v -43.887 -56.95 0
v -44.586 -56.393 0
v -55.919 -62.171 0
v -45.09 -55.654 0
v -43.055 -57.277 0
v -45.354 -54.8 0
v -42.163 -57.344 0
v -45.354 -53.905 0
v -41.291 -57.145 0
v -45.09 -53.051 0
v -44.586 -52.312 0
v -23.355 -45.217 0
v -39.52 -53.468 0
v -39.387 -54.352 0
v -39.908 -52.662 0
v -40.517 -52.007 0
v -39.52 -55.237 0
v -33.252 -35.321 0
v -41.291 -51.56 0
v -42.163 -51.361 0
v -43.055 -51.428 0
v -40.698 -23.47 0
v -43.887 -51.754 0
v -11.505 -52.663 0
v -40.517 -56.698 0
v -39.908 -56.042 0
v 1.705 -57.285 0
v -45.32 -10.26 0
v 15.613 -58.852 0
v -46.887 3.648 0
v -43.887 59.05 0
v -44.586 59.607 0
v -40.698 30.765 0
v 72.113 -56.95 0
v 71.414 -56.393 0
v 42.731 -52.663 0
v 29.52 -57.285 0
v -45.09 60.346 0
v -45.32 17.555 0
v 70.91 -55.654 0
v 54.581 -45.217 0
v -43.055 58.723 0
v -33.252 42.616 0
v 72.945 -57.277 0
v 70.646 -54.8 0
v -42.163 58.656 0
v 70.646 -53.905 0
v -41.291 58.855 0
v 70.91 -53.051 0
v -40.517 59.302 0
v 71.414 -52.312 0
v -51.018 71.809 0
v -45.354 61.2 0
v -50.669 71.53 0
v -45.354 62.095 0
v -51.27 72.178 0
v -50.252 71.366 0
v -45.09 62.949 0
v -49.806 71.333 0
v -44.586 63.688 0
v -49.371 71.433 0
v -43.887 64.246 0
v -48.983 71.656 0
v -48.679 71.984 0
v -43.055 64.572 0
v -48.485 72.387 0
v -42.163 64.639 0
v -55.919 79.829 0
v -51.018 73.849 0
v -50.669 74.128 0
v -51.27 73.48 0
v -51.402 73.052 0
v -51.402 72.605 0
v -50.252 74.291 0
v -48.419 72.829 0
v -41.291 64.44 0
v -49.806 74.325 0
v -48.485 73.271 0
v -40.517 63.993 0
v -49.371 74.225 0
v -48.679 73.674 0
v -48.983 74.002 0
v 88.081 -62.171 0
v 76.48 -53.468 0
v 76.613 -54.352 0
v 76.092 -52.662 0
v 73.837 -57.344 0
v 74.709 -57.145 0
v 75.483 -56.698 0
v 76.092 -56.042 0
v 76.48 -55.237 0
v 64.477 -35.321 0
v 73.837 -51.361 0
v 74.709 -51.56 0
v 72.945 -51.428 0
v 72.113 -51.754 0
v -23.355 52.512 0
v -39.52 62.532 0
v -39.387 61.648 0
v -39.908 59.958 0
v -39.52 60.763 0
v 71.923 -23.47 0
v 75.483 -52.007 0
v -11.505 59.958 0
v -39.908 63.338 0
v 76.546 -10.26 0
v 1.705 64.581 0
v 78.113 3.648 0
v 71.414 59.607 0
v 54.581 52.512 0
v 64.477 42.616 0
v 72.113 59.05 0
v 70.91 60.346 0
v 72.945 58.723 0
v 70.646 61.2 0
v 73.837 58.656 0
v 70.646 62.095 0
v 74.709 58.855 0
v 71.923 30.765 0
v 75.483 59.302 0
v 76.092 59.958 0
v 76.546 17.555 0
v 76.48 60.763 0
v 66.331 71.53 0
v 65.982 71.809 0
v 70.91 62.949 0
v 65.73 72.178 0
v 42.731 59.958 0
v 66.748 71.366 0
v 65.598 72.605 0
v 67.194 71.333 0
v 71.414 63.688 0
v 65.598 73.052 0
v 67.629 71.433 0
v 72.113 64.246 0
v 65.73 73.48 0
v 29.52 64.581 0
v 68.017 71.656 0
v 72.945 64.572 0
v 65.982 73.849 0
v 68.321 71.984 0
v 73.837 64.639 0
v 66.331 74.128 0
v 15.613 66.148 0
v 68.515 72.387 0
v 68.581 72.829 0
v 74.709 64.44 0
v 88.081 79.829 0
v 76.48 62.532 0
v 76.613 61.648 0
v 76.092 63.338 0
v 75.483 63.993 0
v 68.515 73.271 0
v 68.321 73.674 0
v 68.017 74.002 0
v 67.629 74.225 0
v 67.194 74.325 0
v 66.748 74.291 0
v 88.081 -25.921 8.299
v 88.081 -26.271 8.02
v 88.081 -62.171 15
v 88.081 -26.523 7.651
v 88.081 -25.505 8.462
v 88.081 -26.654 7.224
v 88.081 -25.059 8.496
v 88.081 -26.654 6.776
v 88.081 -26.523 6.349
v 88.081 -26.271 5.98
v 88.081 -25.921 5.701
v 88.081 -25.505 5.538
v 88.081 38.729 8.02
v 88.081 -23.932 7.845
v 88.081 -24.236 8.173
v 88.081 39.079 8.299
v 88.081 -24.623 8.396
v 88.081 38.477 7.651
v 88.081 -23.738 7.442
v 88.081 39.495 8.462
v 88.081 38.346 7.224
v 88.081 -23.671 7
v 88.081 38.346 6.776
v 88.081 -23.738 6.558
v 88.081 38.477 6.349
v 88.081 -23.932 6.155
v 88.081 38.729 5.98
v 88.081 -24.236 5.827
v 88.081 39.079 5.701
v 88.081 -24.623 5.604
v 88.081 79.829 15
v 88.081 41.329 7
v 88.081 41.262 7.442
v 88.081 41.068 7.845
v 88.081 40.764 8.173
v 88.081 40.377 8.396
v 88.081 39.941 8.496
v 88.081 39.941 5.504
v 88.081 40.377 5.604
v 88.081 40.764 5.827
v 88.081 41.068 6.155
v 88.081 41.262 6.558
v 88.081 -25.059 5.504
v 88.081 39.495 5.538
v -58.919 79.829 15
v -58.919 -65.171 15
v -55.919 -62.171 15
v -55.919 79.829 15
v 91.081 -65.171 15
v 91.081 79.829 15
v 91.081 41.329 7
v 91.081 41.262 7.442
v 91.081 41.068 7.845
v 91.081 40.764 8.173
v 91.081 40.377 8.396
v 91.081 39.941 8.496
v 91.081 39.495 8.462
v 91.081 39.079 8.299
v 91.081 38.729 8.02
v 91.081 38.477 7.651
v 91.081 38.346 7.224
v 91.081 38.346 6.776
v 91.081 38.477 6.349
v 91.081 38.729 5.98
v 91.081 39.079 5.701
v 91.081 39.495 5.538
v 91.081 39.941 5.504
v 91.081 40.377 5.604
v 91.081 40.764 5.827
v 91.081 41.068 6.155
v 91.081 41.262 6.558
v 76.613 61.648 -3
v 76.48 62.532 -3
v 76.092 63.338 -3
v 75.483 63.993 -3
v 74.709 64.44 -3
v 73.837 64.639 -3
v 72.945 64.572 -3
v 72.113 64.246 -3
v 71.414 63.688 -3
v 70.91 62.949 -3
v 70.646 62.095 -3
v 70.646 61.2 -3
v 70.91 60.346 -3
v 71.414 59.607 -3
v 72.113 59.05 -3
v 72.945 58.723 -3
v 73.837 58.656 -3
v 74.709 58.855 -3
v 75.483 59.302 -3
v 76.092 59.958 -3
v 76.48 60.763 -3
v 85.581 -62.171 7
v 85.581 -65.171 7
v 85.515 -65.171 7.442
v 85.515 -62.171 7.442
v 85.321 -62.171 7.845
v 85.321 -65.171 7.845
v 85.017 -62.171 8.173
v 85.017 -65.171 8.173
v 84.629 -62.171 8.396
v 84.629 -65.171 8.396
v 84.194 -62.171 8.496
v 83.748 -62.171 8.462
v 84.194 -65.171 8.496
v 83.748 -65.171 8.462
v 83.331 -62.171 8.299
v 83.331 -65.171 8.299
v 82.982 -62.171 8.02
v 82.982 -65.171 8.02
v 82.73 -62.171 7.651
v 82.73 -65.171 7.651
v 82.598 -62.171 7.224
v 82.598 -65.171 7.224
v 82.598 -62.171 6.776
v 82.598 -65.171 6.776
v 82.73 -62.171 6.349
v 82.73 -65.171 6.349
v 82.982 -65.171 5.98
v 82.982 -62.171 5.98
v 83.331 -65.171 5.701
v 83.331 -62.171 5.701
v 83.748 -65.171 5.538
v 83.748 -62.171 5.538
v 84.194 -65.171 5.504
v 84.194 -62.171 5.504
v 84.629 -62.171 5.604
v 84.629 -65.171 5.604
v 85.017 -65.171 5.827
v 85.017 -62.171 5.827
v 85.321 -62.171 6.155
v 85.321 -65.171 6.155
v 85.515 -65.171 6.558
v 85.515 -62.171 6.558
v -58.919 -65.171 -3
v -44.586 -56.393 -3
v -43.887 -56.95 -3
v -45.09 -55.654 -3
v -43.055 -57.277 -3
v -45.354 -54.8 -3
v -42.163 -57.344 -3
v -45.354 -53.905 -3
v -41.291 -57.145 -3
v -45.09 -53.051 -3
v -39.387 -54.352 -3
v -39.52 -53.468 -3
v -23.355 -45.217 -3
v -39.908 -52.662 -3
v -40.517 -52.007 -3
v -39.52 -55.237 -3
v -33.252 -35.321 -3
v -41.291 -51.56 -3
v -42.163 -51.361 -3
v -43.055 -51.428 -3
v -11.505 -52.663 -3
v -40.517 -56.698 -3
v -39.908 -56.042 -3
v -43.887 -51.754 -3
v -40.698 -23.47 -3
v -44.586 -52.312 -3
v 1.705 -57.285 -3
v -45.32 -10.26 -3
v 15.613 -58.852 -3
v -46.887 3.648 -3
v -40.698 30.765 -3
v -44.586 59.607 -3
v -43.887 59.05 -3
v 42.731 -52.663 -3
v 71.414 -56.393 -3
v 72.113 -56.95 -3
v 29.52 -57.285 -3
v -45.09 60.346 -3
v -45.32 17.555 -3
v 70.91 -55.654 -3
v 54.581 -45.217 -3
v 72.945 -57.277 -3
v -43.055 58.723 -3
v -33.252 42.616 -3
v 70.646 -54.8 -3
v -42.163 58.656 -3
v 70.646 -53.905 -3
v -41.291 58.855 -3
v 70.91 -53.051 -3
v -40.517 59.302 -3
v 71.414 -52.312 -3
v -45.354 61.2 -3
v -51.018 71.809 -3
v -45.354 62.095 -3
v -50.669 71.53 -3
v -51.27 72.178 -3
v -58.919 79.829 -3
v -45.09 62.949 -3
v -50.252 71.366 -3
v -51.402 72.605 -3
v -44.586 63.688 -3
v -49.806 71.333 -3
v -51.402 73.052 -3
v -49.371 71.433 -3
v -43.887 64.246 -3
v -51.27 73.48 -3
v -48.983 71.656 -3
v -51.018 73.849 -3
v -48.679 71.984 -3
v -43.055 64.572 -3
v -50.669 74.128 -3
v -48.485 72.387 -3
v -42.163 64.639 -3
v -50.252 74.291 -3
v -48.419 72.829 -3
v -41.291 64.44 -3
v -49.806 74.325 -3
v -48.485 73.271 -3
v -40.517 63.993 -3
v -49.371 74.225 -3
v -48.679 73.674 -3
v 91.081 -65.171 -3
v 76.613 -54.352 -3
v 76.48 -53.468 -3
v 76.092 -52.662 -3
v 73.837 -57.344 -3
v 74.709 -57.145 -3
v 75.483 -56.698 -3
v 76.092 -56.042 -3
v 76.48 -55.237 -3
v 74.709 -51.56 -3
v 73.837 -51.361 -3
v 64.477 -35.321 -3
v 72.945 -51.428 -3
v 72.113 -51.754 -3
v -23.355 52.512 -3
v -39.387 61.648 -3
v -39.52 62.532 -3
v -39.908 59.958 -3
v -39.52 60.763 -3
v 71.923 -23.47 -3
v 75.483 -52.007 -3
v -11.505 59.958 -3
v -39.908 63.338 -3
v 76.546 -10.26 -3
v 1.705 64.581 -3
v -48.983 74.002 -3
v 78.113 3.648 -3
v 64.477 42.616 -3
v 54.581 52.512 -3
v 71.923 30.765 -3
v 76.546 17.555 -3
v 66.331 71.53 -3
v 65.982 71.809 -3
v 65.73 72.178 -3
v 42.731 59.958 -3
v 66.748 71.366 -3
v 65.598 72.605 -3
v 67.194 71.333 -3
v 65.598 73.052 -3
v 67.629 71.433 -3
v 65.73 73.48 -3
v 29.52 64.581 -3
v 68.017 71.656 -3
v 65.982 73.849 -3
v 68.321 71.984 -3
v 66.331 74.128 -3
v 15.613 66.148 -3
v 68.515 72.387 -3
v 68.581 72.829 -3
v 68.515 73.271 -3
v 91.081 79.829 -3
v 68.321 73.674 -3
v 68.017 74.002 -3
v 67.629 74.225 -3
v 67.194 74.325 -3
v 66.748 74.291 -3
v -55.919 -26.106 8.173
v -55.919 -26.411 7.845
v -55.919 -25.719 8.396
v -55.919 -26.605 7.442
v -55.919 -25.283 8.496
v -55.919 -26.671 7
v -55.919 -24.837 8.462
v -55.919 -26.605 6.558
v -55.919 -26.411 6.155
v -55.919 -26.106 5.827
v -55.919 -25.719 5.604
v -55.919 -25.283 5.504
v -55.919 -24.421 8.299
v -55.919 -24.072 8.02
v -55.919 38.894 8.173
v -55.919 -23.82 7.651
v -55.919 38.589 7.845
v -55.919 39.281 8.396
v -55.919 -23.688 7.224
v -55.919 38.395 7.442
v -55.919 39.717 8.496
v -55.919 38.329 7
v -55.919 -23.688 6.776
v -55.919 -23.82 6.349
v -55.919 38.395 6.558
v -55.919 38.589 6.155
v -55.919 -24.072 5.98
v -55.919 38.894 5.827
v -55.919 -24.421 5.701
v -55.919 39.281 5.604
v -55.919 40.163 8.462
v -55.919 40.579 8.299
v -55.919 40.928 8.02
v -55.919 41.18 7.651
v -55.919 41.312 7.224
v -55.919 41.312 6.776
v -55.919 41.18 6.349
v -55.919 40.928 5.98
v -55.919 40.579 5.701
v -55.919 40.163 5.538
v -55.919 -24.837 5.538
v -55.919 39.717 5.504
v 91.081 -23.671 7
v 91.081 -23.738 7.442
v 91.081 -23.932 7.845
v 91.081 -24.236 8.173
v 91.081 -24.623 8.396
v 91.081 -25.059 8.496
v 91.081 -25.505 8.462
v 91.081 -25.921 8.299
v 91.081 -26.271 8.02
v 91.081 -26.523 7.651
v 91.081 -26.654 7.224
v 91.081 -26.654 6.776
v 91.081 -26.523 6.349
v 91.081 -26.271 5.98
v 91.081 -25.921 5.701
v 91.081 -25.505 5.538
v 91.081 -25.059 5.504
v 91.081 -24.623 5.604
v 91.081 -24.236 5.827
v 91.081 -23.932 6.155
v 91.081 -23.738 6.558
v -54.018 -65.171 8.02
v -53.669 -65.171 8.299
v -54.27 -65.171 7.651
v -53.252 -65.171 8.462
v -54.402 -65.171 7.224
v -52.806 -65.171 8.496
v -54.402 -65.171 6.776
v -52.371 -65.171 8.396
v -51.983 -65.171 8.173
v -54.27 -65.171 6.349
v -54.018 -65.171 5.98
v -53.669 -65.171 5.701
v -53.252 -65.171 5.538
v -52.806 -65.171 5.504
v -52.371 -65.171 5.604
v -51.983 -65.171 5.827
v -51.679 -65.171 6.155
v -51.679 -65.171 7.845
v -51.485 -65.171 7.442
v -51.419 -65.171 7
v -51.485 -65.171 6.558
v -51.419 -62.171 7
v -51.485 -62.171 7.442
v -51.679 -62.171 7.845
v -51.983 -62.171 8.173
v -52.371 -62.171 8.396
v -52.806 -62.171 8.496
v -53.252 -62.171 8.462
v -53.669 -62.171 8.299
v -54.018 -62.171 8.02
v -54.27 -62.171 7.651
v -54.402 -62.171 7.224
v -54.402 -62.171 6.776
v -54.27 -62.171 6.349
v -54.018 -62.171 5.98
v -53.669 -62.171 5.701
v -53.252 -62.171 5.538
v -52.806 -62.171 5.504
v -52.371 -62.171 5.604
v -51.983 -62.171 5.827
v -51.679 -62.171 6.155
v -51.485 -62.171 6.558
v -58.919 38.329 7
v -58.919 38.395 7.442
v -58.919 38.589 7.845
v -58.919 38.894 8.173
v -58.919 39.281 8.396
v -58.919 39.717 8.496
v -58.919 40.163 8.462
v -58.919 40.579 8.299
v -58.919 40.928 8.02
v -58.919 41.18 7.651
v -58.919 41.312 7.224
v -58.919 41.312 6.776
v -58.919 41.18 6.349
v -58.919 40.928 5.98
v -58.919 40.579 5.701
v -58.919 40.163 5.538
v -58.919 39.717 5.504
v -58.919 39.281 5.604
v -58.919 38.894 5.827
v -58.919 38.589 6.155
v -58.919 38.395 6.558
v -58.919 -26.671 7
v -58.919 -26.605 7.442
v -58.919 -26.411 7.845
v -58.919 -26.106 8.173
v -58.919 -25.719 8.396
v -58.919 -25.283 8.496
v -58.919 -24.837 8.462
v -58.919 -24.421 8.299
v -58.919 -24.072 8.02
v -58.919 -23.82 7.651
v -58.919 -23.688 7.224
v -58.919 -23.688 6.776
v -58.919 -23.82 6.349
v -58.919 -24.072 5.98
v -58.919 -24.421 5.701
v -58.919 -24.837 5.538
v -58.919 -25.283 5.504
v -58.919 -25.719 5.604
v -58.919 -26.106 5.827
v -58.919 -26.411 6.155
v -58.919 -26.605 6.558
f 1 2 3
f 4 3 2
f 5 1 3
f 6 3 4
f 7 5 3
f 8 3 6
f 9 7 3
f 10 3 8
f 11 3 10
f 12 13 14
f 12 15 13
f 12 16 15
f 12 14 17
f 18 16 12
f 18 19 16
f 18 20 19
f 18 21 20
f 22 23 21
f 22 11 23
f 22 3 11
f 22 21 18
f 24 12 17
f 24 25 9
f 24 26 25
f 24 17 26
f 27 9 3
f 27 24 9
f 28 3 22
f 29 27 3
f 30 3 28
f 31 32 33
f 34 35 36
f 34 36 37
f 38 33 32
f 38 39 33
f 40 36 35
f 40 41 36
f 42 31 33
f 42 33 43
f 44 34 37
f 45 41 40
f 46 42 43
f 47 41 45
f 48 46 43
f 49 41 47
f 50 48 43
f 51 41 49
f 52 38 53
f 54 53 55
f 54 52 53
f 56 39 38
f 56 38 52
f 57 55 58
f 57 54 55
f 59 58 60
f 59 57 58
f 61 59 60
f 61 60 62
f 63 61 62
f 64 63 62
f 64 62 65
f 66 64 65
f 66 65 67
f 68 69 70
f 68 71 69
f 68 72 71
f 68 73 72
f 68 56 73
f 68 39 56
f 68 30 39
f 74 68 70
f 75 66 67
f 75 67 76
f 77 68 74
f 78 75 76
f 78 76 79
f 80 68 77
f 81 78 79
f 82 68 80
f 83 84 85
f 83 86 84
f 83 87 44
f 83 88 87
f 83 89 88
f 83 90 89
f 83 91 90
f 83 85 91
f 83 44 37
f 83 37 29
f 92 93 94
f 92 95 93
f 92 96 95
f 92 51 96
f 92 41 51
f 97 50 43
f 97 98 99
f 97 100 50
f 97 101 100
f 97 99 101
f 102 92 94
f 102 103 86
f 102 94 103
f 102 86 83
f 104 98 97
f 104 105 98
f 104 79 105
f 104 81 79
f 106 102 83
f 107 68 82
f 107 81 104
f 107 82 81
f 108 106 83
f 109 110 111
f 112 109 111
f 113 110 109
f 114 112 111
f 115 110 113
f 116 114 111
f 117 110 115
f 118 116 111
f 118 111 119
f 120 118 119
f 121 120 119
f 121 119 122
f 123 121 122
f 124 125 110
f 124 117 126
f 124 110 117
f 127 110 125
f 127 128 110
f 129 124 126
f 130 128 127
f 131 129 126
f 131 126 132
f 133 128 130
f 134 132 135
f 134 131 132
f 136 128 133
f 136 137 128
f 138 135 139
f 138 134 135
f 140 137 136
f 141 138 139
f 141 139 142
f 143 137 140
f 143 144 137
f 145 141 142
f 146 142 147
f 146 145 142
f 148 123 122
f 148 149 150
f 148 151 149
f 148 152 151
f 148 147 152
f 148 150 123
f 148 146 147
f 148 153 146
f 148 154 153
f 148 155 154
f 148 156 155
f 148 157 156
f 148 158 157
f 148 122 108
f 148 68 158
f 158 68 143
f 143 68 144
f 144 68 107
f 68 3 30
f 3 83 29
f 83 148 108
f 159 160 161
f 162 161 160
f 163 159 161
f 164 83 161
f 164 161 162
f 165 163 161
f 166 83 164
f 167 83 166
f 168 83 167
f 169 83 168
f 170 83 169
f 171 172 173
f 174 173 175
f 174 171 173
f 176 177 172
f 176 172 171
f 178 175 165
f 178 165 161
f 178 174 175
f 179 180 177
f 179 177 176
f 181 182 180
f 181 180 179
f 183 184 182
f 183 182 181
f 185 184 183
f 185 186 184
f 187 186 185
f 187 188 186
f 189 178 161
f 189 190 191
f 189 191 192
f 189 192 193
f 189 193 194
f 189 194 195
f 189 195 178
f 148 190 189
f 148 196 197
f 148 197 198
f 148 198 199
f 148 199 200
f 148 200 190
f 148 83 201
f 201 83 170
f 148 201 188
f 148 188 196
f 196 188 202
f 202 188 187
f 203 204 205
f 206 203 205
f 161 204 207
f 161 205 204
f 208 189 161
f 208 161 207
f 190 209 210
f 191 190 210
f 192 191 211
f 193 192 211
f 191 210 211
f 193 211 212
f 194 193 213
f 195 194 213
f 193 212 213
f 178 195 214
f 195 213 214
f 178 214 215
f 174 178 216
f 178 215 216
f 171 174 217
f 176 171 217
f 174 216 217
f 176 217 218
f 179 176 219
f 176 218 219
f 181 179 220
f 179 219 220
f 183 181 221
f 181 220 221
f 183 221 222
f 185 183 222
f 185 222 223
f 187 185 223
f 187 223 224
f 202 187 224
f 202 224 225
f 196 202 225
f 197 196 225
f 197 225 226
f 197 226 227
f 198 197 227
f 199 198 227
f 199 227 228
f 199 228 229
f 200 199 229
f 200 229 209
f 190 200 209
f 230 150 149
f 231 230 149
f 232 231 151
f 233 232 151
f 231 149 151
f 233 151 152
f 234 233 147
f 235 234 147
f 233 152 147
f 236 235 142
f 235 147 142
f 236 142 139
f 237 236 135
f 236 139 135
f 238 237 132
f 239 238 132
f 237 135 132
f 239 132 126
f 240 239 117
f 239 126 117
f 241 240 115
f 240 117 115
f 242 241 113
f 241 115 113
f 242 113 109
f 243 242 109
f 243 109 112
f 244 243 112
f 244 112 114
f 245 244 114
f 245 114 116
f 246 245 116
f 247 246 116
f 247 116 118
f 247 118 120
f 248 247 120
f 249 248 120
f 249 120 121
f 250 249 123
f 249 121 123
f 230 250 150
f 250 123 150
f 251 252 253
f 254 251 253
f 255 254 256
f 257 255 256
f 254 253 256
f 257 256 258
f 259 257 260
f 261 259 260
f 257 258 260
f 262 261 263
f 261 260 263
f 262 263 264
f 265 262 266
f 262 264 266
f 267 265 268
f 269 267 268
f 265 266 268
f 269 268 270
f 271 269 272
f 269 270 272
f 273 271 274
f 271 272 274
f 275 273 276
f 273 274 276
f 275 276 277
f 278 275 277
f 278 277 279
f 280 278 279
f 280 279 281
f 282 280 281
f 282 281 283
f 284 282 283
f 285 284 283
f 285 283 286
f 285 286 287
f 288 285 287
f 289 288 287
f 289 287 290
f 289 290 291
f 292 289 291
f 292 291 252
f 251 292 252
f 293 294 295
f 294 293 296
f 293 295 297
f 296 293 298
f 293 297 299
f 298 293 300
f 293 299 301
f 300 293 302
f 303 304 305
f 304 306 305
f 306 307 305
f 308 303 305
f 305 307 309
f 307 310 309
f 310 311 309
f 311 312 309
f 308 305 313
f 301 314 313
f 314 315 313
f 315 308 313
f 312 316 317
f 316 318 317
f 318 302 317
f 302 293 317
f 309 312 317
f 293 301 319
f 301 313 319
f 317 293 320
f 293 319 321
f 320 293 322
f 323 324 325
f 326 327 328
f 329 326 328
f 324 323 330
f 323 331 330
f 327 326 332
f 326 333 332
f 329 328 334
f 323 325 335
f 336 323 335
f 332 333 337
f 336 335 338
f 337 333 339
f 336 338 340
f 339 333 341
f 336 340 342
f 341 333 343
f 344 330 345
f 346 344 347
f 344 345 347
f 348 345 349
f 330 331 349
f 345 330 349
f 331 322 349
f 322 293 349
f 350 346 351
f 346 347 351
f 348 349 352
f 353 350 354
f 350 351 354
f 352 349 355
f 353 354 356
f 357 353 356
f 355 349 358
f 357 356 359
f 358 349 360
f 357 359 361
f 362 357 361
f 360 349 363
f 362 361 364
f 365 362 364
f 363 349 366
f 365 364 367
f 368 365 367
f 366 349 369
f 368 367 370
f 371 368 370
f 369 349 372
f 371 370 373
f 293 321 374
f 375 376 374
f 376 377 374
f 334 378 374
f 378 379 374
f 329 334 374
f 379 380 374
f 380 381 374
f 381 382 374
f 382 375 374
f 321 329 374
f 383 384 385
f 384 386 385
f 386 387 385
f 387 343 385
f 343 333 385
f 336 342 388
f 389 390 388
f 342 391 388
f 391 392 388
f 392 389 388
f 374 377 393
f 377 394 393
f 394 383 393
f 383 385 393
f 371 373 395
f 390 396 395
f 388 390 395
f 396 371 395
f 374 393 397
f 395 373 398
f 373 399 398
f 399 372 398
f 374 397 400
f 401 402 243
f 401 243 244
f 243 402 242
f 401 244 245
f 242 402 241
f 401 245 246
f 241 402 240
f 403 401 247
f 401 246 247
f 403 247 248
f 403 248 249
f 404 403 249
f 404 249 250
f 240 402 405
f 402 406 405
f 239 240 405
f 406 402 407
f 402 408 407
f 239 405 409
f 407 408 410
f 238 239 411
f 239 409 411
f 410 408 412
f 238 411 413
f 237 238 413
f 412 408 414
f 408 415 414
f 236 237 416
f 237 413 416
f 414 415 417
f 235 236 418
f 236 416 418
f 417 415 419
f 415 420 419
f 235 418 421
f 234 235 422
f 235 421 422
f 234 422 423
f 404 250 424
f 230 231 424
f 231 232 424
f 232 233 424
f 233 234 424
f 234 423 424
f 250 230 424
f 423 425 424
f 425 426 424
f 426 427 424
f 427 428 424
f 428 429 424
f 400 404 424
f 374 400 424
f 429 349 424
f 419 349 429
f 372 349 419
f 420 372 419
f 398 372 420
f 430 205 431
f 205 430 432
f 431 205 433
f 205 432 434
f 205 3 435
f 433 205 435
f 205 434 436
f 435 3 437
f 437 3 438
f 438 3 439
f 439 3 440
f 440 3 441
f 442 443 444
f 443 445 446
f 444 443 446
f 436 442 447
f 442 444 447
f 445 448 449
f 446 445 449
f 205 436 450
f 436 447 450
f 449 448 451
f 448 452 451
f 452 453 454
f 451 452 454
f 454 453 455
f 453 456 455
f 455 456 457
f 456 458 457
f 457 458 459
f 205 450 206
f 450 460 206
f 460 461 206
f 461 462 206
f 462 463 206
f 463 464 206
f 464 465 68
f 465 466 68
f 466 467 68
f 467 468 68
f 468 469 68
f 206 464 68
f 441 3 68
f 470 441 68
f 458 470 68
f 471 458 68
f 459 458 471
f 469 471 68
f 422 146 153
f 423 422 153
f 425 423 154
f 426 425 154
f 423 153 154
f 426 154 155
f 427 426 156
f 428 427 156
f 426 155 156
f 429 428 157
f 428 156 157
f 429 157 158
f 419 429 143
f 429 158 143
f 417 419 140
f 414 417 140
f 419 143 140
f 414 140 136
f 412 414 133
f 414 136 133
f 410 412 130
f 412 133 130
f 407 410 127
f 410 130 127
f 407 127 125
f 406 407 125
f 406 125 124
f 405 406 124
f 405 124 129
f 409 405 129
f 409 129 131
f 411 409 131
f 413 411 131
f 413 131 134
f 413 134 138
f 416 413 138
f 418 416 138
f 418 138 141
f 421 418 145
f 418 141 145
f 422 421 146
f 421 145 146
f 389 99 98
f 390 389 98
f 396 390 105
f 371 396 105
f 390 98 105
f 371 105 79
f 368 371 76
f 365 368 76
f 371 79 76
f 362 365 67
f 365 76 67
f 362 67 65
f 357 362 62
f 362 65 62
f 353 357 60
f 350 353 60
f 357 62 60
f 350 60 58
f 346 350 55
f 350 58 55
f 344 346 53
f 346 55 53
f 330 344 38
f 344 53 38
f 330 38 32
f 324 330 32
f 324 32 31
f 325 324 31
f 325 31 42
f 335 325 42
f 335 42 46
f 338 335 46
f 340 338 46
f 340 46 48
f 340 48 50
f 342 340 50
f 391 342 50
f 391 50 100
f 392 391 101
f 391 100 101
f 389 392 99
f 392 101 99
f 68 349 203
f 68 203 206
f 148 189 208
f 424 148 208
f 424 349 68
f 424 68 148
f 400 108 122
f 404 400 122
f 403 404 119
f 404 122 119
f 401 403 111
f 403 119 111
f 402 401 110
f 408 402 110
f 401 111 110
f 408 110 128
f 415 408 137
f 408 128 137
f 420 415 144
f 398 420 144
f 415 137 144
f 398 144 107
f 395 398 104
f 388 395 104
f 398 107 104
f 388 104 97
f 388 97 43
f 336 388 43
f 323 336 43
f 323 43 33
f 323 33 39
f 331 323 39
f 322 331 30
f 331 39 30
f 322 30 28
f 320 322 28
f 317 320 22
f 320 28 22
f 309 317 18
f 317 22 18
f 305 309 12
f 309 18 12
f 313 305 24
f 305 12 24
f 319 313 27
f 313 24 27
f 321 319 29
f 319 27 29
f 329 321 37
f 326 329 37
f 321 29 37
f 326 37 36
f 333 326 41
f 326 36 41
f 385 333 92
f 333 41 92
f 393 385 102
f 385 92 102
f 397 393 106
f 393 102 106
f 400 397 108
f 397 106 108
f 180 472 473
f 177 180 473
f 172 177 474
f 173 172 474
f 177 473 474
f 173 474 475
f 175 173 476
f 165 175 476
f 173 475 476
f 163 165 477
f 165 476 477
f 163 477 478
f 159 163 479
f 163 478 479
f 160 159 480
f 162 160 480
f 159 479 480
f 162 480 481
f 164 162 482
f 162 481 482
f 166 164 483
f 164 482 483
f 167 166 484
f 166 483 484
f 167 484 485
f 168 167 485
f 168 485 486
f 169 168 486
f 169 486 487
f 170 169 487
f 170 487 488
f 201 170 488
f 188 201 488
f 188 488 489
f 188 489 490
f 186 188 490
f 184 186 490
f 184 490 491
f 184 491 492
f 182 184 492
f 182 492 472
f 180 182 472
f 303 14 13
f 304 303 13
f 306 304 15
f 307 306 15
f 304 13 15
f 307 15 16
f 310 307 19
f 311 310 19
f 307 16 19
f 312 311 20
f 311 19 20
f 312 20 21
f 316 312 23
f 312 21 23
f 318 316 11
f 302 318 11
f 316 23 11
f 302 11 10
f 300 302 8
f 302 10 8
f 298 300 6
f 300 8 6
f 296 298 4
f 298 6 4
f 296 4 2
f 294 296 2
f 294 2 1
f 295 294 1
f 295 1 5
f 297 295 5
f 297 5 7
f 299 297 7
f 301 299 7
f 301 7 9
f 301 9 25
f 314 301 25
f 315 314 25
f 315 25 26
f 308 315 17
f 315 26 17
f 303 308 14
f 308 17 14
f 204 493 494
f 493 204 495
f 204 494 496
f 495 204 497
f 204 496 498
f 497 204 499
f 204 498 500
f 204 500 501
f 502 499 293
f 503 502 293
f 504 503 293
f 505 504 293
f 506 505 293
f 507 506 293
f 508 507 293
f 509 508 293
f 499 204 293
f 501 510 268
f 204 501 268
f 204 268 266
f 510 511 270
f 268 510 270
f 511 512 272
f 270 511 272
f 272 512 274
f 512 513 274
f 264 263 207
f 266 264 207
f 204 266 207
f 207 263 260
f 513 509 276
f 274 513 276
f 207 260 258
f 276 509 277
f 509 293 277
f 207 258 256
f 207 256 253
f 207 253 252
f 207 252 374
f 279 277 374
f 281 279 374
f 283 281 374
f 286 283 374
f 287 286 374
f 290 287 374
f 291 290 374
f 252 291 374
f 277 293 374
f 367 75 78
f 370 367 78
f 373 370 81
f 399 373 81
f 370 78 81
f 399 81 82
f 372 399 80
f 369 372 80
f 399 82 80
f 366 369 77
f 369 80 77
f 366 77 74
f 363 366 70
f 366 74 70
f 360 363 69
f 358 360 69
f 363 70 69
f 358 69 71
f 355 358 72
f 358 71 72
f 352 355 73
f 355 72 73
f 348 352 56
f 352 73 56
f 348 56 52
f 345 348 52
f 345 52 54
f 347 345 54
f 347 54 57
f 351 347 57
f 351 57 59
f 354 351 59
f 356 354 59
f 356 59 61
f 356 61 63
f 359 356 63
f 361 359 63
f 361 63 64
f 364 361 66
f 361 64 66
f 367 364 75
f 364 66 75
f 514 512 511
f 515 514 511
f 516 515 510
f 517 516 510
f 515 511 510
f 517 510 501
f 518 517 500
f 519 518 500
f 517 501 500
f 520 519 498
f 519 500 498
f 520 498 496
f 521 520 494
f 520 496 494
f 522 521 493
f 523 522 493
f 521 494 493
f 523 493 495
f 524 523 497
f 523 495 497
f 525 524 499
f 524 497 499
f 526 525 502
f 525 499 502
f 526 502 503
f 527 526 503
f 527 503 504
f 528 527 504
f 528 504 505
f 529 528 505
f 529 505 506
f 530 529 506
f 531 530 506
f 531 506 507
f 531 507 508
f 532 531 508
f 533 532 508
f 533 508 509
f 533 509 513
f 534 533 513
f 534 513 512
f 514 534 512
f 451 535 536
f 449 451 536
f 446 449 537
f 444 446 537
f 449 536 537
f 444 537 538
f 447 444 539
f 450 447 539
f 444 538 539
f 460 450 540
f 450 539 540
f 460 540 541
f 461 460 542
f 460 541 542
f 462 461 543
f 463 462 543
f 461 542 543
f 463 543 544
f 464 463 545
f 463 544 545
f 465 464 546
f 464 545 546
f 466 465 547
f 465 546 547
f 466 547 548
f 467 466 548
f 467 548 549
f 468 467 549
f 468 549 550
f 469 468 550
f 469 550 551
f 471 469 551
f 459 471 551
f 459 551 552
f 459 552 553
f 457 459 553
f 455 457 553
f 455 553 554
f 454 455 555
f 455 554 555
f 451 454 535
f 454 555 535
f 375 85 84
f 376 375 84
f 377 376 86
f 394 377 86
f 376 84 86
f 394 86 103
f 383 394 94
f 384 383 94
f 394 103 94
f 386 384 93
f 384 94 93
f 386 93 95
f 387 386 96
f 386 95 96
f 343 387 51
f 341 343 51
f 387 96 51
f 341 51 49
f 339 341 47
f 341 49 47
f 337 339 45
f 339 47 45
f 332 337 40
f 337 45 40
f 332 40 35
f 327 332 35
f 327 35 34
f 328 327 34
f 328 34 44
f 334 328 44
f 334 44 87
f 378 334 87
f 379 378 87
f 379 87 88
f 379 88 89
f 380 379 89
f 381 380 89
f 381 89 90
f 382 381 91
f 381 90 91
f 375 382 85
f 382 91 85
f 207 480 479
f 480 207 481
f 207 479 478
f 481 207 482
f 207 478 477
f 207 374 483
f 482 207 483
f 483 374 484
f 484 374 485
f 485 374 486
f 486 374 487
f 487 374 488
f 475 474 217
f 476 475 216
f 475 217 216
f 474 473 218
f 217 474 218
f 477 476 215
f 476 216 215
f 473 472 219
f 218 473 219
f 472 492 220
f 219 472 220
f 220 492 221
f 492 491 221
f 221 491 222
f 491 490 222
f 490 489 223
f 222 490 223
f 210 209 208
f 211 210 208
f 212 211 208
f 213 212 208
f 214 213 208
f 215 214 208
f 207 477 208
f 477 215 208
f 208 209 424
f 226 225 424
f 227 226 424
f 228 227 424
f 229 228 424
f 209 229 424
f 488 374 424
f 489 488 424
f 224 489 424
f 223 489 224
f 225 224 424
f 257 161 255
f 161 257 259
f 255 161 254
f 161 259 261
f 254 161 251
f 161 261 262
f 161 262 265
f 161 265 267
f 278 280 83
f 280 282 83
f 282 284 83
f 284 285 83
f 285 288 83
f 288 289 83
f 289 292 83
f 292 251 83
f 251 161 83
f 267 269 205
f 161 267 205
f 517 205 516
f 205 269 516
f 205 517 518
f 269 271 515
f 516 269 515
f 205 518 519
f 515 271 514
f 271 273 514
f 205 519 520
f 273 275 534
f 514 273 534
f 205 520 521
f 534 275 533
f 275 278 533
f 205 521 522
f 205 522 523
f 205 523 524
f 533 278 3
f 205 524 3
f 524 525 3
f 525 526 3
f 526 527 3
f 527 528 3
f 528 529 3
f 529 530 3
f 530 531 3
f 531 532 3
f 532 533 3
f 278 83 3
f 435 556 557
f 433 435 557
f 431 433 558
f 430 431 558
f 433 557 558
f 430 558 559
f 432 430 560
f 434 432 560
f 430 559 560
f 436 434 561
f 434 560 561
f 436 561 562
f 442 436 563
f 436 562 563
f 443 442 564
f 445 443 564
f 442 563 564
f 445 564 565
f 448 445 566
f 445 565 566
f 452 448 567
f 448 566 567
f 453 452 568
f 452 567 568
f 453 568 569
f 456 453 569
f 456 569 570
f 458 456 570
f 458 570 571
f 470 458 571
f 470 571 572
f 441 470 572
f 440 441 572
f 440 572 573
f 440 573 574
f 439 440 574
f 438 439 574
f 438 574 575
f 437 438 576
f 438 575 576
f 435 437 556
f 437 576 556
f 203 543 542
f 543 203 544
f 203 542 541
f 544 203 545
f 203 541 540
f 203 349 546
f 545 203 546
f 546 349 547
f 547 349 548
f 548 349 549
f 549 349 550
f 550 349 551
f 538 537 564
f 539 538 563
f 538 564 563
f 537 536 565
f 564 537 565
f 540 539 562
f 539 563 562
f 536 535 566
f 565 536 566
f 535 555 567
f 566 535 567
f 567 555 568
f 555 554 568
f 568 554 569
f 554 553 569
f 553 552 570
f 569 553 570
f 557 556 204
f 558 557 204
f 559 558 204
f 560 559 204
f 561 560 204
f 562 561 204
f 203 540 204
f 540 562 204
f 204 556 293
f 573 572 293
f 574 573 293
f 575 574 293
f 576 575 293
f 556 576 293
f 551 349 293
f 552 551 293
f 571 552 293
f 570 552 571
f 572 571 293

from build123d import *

# Parameters (mm, degrees)
F0_W     = 3
F0_H     = 142
F0_W_2   = 144
F0_R     = 3
F0_R_2   = 62.5
F0_R_3   = 1.5
F0_H_2   = 3
F1_DEPTH = 3
F2_DEPTH = 15
F5_R     = 1.5
F6_DEPTH = 3
F4_R     = 1.5
F7_DEPTH = 25
F3_R     = 1.5
F8_DEPTH = 25


with BuildPart() as f1:
    # F0 (on Top) → F1 (new body)
    with BuildSketch(Plane.XY):
        with Locations((-57.4185222983, 8.8288192153)):
            Rectangle(F0_W, F0_H)
        with Locations((16.0814777017, 8.8288192153)):
            Rectangle(F0_W_2, F0_H)
        with Locations((-42.3870939074, -54.3524108875)):
            Circle(F0_R, mode=Mode.SUBTRACT)
        with Locations((73.6129060926, -54.3524108875)):
            Circle(F0_R, mode=Mode.SUBTRACT)
        with Locations((15.6129060926, 3.6475891125)):
            Circle(F0_R_2, mode=Mode.SUBTRACT)
        with Locations((-42.3870939074, 61.6475891125)):
            Circle(F0_R, mode=Mode.SUBTRACT)
        with Locations((-49.9185222983, 72.8288192153)):
            Circle(F0_R_3, mode=Mode.SUBTRACT)
        with Locations((73.6129060926, 61.6475891125)):
            Circle(F0_R, mode=Mode.SUBTRACT)
        with Locations((67.0814777017, 72.8288192153)):
            Circle(F0_R_3, mode=Mode.SUBTRACT)
        with Locations((89.5814777017, 8.8288192153)):
            Rectangle(F0_W, F0_H)
        with Locations((16.0814777017, -63.6711807847)):
            Rectangle(F0_W_2, F0_H_2)
        with Locations((89.5814777017, -63.6711807847)):
            Rectangle(F0_W, F0_H_2)
        with Locations((-57.4185222983, -63.6711807847)):
            Rectangle(F0_W, F0_H_2)
    extrude(amount=-F1_DEPTH)

    # F0 (on Top) → F2 (join)
    with BuildSketch(Plane.XY):
        with Locations((-57.4185222983, 8.8288192153)):
            Rectangle(F0_W, F0_H)
        with Locations((-57.4185222983, -63.6711807847)):
            Rectangle(F0_W, F0_H_2)
        with Locations((16.0814777017, -63.6711807847)):
            Rectangle(F0_W_2, F0_H_2)
        with Locations((89.5814777017, -63.6711807847)):
            Rectangle(F0_W, F0_H_2)
        with Locations((89.5814777017, 8.8288192153)):
            Rectangle(F0_W, F0_H)
    extrude(amount=F2_DEPTH)

    # F5 (on face) → F6 (cut)
    with BuildSketch(Plane(origin=(-58.9185222983, 0, 0), x_dir=(0, -1, 0), z_dir=(-1, 0, 0))):
        with Locations((25.1711807847, 7)):
            Circle(F5_R)
        with Locations((-39.8288192153, 7)):
            Circle(F5_R)
    extrude(amount=-F6_DEPTH, mode=Mode.SUBTRACT)

    # F4 (on face) → F7 (cut)
    with BuildSketch(Plane.XZ.offset(65.1711807847)):
        with Locations((-52.9185222983, 7)):
            Circle(F4_R)
        with Locations((84.0814777017, 7)):
            Circle(F4_R)
    extrude(amount=-F7_DEPTH, mode=Mode.SUBTRACT)

    # F3 (on face) → F8 (cut)
    with BuildSketch(Plane.YZ.offset(91.0814777017)):
        with Locations((-25.1711807847, 7)):
            Circle(F3_R)
        with Locations((39.8288192153, 7)):
            Circle(F3_R)
    extrude(amount=-F8_DEPTH, mode=Mode.SUBTRACT)


solid = f1.part
